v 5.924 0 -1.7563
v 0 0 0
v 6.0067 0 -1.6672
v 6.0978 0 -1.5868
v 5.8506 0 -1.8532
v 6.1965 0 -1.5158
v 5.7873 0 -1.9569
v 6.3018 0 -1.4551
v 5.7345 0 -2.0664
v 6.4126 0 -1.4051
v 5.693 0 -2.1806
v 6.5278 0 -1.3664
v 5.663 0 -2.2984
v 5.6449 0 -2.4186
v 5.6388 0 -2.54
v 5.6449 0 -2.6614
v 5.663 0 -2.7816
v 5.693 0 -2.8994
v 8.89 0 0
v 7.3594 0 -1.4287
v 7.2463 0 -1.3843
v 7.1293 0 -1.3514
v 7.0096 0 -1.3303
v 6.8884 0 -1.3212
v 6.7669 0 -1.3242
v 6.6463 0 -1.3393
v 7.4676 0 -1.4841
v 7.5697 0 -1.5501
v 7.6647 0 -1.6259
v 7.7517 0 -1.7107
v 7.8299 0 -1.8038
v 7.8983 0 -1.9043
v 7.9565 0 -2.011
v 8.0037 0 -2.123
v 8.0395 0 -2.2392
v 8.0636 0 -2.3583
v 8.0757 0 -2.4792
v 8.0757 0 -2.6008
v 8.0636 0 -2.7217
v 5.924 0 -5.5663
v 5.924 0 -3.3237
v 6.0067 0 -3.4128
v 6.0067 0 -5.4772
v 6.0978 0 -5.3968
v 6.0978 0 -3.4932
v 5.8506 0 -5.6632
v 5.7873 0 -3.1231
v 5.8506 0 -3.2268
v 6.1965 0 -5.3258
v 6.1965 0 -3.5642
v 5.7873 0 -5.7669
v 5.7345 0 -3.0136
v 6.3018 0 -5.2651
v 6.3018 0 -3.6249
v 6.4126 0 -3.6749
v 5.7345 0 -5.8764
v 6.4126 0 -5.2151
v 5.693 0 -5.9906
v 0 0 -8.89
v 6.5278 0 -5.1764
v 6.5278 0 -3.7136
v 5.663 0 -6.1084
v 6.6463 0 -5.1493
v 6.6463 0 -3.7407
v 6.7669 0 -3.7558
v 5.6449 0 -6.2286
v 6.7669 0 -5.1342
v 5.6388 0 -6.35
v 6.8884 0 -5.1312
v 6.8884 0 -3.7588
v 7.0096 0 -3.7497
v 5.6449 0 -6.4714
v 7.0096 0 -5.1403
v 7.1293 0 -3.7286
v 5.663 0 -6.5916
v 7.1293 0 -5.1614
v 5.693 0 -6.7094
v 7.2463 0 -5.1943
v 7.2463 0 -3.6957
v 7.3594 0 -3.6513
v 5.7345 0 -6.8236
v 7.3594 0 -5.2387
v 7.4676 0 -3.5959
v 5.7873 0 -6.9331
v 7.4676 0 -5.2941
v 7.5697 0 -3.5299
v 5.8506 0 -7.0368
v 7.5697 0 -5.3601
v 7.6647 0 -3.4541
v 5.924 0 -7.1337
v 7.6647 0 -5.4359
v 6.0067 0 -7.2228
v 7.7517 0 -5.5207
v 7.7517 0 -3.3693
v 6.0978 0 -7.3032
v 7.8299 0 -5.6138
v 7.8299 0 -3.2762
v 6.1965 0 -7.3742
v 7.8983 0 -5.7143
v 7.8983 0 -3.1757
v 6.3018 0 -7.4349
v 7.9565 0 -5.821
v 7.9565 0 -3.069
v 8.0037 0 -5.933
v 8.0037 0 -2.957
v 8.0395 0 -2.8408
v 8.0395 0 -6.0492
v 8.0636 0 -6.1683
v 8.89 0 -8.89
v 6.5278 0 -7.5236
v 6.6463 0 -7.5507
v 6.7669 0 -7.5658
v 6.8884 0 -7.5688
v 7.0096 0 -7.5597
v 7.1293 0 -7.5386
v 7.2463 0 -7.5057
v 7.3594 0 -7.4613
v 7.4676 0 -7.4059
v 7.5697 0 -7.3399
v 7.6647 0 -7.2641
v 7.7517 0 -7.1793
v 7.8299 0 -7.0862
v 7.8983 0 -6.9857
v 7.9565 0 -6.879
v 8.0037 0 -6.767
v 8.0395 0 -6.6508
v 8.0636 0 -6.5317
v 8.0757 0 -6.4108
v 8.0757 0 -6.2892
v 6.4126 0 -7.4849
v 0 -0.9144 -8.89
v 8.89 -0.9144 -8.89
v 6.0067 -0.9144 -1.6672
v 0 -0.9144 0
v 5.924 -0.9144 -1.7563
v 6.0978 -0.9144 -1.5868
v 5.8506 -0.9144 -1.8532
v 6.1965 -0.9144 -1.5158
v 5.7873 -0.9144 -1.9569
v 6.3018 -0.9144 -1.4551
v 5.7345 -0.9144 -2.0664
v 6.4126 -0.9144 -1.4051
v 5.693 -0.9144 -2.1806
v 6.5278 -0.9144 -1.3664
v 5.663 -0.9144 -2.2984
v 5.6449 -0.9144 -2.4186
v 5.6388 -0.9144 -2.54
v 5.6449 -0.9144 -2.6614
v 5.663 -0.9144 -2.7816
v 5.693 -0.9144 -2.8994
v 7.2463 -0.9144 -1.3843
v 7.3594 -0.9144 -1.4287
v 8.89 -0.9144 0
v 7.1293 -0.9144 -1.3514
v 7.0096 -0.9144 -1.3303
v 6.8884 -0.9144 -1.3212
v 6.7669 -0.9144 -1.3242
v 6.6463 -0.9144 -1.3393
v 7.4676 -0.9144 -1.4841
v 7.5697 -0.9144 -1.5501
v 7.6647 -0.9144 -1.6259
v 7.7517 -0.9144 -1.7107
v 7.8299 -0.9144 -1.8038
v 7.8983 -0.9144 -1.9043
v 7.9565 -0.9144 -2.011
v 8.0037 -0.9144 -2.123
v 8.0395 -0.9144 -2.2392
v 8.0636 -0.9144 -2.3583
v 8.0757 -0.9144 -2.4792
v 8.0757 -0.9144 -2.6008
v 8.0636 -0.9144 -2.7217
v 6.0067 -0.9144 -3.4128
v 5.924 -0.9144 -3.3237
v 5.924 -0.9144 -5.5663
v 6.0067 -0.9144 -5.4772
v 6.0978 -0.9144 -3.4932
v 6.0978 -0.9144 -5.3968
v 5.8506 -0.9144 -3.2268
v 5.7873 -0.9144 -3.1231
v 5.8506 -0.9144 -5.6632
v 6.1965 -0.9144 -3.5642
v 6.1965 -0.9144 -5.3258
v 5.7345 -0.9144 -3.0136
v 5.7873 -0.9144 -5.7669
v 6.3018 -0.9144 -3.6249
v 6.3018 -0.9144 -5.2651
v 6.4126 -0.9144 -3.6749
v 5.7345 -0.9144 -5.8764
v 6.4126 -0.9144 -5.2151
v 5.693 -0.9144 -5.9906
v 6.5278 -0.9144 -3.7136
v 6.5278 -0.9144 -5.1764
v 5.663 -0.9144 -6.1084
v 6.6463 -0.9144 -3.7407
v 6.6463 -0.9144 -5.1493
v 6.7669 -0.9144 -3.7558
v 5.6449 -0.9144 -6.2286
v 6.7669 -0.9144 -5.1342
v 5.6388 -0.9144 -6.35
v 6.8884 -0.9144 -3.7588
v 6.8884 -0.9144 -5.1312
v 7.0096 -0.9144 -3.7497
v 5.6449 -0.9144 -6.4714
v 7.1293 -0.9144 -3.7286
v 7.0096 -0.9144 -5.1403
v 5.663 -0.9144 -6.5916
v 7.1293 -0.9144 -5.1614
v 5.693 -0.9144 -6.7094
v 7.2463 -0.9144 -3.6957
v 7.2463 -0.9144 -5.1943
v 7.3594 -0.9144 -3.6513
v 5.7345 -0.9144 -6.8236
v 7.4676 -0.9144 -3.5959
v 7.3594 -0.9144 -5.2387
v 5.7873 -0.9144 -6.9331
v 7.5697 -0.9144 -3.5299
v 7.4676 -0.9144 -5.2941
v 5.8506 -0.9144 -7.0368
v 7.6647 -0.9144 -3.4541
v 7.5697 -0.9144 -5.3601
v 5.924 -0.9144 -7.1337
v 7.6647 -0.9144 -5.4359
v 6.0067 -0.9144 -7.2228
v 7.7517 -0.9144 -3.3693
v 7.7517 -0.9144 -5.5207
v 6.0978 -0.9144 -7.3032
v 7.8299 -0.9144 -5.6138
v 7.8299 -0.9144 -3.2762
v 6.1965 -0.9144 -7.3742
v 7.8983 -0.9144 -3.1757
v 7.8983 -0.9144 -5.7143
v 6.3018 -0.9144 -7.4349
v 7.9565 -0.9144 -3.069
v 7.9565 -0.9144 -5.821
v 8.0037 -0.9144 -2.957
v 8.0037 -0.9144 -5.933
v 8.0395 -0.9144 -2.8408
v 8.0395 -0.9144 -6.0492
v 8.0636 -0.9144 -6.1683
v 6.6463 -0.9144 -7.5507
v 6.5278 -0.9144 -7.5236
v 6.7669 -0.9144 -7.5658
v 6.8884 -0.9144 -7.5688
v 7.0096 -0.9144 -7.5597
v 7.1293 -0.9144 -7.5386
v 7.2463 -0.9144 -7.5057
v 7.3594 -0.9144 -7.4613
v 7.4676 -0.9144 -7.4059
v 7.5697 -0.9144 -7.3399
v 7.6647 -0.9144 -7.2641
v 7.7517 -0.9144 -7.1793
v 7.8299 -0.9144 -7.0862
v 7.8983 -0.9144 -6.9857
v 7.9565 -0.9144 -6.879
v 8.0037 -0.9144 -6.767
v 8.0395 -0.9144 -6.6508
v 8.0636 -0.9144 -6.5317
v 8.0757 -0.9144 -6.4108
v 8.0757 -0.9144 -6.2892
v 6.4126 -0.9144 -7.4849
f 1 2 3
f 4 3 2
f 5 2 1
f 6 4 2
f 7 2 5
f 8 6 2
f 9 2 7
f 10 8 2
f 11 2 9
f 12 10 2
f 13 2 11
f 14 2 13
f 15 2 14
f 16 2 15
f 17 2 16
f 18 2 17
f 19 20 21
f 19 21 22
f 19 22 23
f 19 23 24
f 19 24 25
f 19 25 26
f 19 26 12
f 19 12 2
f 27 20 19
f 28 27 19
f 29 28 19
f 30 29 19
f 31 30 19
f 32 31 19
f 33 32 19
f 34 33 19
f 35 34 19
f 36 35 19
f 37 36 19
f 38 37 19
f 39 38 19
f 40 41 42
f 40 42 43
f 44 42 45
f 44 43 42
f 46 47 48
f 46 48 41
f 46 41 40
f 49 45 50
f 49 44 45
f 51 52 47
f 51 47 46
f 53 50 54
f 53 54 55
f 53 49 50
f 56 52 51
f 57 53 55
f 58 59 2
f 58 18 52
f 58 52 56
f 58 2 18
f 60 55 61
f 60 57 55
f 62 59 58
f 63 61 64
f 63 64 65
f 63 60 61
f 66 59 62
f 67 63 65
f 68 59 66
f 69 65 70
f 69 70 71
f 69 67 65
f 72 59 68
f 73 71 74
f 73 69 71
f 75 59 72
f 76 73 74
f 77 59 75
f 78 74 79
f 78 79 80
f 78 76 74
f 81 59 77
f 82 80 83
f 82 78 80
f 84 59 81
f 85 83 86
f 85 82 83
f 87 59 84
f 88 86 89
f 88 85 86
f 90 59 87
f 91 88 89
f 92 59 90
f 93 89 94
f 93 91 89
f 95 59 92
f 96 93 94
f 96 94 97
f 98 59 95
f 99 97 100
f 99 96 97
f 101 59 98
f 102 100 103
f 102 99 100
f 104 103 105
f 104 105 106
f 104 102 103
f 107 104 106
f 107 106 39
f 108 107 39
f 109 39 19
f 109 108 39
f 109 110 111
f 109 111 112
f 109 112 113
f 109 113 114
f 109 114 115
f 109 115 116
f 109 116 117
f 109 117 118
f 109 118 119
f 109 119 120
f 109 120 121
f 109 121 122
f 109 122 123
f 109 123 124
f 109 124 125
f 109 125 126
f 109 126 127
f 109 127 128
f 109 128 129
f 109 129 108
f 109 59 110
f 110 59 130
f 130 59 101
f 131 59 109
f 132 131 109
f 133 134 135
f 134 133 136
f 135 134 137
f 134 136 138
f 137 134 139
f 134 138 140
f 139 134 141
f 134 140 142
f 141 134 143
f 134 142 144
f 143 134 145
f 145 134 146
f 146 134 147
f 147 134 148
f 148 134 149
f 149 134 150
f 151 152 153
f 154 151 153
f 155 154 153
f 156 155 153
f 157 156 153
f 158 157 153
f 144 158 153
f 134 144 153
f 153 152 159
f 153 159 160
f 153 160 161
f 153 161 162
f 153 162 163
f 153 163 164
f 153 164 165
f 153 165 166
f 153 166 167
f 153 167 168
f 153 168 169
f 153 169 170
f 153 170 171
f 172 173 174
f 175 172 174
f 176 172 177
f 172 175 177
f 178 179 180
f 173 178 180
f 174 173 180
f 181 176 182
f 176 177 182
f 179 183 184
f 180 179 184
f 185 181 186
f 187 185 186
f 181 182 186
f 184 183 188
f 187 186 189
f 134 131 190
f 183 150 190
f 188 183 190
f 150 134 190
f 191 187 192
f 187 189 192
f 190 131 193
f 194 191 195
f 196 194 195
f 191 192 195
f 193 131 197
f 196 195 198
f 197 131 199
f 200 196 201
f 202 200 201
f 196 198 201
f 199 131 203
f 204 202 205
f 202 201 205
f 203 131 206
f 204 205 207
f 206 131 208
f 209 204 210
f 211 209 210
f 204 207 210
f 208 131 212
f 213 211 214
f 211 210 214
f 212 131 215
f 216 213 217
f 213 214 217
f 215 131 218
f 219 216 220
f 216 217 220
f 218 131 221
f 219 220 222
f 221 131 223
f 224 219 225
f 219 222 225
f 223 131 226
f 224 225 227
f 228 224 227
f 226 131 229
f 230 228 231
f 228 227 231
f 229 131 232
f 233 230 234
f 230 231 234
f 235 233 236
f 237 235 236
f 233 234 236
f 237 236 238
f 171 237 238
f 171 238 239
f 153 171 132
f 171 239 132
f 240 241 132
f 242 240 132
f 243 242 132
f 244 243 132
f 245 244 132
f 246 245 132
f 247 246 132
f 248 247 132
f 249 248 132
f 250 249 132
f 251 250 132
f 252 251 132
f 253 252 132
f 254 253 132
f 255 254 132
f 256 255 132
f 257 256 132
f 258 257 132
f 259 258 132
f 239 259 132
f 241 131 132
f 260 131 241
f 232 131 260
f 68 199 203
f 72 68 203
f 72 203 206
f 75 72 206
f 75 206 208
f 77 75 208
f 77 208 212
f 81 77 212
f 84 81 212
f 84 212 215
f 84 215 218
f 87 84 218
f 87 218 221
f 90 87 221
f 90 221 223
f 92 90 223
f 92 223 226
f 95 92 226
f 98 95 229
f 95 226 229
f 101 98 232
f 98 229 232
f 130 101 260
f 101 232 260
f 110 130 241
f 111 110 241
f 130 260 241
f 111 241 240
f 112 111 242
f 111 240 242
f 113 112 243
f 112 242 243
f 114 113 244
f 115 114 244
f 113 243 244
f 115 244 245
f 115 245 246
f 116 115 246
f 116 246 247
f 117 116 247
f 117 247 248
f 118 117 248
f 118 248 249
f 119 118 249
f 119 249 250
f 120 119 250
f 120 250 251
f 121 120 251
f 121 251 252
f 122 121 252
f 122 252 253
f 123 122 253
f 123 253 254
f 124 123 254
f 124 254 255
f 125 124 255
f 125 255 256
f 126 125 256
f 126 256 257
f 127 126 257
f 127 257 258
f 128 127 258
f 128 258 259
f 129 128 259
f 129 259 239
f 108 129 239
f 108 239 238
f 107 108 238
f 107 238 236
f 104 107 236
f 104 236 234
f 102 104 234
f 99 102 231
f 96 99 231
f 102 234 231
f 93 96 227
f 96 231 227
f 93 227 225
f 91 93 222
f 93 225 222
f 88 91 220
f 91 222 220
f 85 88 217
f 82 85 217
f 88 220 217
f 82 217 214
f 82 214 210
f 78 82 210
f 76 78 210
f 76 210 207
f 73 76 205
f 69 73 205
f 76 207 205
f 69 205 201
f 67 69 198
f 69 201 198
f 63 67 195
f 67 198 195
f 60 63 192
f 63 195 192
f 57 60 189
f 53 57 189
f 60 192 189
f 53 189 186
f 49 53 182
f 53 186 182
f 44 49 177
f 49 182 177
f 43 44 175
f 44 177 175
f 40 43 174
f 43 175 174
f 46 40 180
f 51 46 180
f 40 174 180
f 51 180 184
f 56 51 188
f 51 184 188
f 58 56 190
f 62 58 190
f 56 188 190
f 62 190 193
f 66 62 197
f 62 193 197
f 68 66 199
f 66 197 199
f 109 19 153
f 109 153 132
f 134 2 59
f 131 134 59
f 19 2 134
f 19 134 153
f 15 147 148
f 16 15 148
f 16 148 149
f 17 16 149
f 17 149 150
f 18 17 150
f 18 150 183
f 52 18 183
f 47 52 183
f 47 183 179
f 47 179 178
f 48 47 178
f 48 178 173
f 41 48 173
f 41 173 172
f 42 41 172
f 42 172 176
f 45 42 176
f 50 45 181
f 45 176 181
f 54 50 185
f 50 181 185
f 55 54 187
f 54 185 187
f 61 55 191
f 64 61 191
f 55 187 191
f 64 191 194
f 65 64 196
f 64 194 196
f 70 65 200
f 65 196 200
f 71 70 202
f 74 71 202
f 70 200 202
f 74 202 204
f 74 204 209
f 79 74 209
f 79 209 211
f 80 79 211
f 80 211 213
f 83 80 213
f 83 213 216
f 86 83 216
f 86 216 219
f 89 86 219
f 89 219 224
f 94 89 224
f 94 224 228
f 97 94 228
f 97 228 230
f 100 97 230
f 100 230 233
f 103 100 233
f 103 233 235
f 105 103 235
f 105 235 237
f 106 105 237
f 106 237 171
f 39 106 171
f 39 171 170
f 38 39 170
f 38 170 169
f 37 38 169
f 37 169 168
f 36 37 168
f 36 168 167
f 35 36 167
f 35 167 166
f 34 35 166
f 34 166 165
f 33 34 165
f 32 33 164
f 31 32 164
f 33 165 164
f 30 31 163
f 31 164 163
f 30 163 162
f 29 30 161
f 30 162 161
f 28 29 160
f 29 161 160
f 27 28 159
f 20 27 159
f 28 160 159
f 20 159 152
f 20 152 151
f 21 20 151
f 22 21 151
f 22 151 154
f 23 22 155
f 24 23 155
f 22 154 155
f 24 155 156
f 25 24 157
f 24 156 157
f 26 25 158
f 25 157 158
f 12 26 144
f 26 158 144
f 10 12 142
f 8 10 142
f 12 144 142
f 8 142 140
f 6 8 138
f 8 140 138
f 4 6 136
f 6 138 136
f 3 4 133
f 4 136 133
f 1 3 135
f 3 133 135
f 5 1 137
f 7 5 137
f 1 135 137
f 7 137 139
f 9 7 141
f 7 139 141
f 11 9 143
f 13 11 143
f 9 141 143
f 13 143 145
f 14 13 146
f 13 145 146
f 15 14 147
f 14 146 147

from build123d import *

# Parameters (mm, degrees)
SKETCH1_W             = 8.89
SKETCH1_H             = 8.89
BASE_FLANGE1_DEPTH    = 0.9144
F_2_CLEARANCE_HOLE1_D = 2.4384


# Sheet-metal steps are written as plain solids
with BuildPart() as part:
    # Sketch1 → Base-Flange1 (new body)
    with BuildSketch(Plane(origin=(0, 0, 0), x_dir=(1, 0, 0), z_dir=(0, 1, 0))):
        with Locations((4.445, 4.445)):
            Rectangle(SKETCH1_W, SKETCH1_H)
    extrude(amount=-BASE_FLANGE1_DEPTH)

    # #2 Clearance Hole1 (through all)
    with Locations(Plane(origin=(0, 0, 0), x_dir=(1, 0, 0), z_dir=(0, 1, 0))):
        with Locations((6.858, 2.54), (6.858, 6.35)):
            Hole(F_2_CLEARANCE_HOLE1_D / 2)


solid = part.part
